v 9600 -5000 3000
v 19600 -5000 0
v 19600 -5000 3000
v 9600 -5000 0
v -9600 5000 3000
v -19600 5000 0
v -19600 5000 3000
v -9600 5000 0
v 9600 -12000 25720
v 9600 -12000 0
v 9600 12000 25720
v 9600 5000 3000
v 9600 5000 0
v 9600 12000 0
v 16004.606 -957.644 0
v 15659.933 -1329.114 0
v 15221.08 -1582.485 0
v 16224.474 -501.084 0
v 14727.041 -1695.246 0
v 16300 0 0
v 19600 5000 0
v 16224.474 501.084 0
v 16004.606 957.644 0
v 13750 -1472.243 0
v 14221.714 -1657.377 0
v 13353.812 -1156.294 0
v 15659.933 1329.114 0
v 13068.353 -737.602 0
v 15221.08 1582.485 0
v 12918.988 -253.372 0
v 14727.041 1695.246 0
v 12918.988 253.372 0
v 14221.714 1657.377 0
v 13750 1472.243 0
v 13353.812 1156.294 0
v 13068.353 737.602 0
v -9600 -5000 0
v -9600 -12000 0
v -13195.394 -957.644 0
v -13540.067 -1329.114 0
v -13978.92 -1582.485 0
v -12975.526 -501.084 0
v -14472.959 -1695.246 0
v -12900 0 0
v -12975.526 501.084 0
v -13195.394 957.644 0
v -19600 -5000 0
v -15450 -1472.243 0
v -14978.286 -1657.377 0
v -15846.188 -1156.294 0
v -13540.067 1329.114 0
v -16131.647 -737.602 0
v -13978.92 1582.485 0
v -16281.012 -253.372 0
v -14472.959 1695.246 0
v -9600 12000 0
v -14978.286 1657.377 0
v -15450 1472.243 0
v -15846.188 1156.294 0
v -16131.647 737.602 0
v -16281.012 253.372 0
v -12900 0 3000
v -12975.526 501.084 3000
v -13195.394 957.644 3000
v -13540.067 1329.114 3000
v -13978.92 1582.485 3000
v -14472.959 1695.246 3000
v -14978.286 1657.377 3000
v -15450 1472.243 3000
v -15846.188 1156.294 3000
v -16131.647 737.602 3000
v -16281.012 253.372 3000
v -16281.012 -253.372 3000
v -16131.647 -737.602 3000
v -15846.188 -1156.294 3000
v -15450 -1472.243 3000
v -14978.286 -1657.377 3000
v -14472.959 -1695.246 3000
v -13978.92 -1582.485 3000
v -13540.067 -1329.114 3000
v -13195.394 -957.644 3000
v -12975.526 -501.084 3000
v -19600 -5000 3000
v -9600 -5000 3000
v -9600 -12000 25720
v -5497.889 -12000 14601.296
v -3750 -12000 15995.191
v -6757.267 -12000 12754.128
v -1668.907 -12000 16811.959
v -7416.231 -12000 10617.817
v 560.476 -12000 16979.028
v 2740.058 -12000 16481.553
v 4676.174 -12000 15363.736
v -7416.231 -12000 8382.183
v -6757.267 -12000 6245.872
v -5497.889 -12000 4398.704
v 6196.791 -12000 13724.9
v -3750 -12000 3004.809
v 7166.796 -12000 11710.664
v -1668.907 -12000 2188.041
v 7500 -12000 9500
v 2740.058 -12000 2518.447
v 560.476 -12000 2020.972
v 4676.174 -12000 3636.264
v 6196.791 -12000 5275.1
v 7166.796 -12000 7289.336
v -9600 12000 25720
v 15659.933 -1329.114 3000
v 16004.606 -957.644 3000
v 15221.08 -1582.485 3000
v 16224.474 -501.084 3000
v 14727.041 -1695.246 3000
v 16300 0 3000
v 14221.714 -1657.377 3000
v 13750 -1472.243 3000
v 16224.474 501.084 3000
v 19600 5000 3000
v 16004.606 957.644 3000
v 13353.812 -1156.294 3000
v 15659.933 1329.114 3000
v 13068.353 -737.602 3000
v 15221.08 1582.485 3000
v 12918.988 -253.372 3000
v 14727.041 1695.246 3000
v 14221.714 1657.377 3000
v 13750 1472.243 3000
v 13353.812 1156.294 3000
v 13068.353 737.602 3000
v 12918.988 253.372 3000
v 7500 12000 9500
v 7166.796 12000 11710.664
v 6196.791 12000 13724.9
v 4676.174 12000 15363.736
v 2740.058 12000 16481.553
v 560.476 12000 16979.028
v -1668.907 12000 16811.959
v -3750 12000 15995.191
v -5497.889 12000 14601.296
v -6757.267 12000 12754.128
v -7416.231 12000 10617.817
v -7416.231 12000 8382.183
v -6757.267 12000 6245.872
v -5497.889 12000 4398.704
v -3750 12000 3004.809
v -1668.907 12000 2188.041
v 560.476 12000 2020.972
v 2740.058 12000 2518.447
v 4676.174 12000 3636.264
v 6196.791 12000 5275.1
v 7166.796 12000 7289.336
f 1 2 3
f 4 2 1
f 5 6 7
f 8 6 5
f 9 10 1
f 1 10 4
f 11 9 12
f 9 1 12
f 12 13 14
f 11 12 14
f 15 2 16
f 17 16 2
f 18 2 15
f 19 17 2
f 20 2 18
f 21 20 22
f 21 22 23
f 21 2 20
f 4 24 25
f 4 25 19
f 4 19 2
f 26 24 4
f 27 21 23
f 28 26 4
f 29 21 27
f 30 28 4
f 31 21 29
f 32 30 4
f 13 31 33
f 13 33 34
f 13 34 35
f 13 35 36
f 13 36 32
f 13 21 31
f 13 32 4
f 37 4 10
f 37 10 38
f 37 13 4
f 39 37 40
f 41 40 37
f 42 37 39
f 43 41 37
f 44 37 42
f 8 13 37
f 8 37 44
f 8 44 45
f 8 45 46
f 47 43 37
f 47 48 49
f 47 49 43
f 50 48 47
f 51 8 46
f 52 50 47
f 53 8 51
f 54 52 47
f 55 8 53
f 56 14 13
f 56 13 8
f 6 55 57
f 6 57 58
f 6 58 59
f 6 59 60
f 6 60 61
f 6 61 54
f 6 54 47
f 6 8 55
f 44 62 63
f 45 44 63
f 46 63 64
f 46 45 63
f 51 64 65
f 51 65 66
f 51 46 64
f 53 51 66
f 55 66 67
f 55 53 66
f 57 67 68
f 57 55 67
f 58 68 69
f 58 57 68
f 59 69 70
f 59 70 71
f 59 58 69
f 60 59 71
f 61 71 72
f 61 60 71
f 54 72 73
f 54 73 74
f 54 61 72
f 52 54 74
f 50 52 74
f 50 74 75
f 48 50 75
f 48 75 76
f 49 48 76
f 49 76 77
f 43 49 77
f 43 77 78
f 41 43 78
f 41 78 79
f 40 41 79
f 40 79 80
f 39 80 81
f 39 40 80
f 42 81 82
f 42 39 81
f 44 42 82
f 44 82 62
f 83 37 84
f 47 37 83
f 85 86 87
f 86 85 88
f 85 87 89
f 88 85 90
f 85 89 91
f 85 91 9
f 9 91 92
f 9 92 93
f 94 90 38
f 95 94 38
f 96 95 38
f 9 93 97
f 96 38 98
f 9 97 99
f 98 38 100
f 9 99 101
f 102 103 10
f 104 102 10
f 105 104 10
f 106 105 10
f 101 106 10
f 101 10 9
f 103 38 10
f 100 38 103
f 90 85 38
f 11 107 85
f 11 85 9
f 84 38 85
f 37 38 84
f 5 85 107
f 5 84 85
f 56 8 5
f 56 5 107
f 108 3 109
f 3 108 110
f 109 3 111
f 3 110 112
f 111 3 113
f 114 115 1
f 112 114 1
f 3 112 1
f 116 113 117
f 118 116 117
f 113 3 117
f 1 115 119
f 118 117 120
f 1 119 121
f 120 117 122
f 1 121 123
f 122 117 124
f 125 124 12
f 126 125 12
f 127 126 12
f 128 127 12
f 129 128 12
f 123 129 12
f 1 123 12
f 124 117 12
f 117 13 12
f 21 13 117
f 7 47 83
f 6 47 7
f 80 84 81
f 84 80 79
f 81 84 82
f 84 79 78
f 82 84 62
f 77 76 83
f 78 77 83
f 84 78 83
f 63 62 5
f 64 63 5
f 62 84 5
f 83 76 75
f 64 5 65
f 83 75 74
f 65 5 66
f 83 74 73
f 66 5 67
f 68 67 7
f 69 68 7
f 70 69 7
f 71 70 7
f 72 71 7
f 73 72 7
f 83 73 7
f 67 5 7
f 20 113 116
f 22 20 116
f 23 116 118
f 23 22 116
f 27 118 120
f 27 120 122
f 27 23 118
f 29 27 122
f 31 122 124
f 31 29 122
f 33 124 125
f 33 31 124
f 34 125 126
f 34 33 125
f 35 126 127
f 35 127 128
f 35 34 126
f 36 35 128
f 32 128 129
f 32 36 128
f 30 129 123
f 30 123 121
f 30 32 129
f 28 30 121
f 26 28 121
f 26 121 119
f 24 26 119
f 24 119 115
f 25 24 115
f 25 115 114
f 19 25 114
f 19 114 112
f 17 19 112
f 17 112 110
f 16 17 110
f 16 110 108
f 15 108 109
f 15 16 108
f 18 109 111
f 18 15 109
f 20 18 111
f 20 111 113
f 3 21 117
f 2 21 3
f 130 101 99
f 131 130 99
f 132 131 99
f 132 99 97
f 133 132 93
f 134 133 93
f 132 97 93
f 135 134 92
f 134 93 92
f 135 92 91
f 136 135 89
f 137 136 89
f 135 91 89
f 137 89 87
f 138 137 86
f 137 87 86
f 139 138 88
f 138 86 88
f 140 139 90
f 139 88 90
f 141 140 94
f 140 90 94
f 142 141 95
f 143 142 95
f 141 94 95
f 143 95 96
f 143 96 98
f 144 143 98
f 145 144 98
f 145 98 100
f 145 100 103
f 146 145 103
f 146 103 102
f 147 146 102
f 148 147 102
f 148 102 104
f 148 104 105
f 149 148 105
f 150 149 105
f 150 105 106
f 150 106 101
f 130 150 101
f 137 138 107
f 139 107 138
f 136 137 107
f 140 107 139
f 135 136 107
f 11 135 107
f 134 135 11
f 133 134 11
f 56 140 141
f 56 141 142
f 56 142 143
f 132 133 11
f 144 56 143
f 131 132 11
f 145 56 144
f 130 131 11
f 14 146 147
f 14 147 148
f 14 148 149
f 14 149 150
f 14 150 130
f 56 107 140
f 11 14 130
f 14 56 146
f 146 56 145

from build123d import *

# Parameters (mm, degrees)
SKETCH2_R           = 1700
BOSS_EXTRUDE1_DEPTH = 3000
SKETCH3_W           = 19200
SKETCH3_H           = 24000
BOSS_EXTRUDE2_DEPTH = 22720
SKETCH4_R           = 7500
CUT_EXTRUDE1_DEPTH  = 40271.068288991


with BuildPart() as part:
    # Sketch2 → Boss-Extrude1 (new body)
    with BuildSketch(Plane.XY):
        Polygon((-19600, 5000), (-9600, 5000), (-9600, 12000), (9600, 12000), (9600, 5000), (19600, 5000), (19600, -5000), (9600, -5000), (9600, -12000), (-9600, -12000), (-9600, -5000), (-19600, -5000), align=None)
        with Locations((-14600, 0)):
            Circle(SKETCH2_R, mode=Mode.SUBTRACT)
        with Locations((14600, 0)):
            Circle(SKETCH2_R, mode=Mode.SUBTRACT)
    extrude(amount=BOSS_EXTRUDE1_DEPTH)

    # Sketch3 → Boss-Extrude2 (add)
    with BuildSketch(Plane.XY.offset(3000)):
        Rectangle(SKETCH3_W, SKETCH3_H)
    extrude(amount=BOSS_EXTRUDE2_DEPTH)

    # Sketch4 → Cut-Extrude1 (cut, through all)
    with BuildSketch(Plane.XZ.offset(12000)):
        with Locations((0, 9500)):
            Circle(SKETCH4_R)
    extrude(amount=-CUT_EXTRUDE1_DEPTH, mode=Mode.SUBTRACT)


solid = part.part
